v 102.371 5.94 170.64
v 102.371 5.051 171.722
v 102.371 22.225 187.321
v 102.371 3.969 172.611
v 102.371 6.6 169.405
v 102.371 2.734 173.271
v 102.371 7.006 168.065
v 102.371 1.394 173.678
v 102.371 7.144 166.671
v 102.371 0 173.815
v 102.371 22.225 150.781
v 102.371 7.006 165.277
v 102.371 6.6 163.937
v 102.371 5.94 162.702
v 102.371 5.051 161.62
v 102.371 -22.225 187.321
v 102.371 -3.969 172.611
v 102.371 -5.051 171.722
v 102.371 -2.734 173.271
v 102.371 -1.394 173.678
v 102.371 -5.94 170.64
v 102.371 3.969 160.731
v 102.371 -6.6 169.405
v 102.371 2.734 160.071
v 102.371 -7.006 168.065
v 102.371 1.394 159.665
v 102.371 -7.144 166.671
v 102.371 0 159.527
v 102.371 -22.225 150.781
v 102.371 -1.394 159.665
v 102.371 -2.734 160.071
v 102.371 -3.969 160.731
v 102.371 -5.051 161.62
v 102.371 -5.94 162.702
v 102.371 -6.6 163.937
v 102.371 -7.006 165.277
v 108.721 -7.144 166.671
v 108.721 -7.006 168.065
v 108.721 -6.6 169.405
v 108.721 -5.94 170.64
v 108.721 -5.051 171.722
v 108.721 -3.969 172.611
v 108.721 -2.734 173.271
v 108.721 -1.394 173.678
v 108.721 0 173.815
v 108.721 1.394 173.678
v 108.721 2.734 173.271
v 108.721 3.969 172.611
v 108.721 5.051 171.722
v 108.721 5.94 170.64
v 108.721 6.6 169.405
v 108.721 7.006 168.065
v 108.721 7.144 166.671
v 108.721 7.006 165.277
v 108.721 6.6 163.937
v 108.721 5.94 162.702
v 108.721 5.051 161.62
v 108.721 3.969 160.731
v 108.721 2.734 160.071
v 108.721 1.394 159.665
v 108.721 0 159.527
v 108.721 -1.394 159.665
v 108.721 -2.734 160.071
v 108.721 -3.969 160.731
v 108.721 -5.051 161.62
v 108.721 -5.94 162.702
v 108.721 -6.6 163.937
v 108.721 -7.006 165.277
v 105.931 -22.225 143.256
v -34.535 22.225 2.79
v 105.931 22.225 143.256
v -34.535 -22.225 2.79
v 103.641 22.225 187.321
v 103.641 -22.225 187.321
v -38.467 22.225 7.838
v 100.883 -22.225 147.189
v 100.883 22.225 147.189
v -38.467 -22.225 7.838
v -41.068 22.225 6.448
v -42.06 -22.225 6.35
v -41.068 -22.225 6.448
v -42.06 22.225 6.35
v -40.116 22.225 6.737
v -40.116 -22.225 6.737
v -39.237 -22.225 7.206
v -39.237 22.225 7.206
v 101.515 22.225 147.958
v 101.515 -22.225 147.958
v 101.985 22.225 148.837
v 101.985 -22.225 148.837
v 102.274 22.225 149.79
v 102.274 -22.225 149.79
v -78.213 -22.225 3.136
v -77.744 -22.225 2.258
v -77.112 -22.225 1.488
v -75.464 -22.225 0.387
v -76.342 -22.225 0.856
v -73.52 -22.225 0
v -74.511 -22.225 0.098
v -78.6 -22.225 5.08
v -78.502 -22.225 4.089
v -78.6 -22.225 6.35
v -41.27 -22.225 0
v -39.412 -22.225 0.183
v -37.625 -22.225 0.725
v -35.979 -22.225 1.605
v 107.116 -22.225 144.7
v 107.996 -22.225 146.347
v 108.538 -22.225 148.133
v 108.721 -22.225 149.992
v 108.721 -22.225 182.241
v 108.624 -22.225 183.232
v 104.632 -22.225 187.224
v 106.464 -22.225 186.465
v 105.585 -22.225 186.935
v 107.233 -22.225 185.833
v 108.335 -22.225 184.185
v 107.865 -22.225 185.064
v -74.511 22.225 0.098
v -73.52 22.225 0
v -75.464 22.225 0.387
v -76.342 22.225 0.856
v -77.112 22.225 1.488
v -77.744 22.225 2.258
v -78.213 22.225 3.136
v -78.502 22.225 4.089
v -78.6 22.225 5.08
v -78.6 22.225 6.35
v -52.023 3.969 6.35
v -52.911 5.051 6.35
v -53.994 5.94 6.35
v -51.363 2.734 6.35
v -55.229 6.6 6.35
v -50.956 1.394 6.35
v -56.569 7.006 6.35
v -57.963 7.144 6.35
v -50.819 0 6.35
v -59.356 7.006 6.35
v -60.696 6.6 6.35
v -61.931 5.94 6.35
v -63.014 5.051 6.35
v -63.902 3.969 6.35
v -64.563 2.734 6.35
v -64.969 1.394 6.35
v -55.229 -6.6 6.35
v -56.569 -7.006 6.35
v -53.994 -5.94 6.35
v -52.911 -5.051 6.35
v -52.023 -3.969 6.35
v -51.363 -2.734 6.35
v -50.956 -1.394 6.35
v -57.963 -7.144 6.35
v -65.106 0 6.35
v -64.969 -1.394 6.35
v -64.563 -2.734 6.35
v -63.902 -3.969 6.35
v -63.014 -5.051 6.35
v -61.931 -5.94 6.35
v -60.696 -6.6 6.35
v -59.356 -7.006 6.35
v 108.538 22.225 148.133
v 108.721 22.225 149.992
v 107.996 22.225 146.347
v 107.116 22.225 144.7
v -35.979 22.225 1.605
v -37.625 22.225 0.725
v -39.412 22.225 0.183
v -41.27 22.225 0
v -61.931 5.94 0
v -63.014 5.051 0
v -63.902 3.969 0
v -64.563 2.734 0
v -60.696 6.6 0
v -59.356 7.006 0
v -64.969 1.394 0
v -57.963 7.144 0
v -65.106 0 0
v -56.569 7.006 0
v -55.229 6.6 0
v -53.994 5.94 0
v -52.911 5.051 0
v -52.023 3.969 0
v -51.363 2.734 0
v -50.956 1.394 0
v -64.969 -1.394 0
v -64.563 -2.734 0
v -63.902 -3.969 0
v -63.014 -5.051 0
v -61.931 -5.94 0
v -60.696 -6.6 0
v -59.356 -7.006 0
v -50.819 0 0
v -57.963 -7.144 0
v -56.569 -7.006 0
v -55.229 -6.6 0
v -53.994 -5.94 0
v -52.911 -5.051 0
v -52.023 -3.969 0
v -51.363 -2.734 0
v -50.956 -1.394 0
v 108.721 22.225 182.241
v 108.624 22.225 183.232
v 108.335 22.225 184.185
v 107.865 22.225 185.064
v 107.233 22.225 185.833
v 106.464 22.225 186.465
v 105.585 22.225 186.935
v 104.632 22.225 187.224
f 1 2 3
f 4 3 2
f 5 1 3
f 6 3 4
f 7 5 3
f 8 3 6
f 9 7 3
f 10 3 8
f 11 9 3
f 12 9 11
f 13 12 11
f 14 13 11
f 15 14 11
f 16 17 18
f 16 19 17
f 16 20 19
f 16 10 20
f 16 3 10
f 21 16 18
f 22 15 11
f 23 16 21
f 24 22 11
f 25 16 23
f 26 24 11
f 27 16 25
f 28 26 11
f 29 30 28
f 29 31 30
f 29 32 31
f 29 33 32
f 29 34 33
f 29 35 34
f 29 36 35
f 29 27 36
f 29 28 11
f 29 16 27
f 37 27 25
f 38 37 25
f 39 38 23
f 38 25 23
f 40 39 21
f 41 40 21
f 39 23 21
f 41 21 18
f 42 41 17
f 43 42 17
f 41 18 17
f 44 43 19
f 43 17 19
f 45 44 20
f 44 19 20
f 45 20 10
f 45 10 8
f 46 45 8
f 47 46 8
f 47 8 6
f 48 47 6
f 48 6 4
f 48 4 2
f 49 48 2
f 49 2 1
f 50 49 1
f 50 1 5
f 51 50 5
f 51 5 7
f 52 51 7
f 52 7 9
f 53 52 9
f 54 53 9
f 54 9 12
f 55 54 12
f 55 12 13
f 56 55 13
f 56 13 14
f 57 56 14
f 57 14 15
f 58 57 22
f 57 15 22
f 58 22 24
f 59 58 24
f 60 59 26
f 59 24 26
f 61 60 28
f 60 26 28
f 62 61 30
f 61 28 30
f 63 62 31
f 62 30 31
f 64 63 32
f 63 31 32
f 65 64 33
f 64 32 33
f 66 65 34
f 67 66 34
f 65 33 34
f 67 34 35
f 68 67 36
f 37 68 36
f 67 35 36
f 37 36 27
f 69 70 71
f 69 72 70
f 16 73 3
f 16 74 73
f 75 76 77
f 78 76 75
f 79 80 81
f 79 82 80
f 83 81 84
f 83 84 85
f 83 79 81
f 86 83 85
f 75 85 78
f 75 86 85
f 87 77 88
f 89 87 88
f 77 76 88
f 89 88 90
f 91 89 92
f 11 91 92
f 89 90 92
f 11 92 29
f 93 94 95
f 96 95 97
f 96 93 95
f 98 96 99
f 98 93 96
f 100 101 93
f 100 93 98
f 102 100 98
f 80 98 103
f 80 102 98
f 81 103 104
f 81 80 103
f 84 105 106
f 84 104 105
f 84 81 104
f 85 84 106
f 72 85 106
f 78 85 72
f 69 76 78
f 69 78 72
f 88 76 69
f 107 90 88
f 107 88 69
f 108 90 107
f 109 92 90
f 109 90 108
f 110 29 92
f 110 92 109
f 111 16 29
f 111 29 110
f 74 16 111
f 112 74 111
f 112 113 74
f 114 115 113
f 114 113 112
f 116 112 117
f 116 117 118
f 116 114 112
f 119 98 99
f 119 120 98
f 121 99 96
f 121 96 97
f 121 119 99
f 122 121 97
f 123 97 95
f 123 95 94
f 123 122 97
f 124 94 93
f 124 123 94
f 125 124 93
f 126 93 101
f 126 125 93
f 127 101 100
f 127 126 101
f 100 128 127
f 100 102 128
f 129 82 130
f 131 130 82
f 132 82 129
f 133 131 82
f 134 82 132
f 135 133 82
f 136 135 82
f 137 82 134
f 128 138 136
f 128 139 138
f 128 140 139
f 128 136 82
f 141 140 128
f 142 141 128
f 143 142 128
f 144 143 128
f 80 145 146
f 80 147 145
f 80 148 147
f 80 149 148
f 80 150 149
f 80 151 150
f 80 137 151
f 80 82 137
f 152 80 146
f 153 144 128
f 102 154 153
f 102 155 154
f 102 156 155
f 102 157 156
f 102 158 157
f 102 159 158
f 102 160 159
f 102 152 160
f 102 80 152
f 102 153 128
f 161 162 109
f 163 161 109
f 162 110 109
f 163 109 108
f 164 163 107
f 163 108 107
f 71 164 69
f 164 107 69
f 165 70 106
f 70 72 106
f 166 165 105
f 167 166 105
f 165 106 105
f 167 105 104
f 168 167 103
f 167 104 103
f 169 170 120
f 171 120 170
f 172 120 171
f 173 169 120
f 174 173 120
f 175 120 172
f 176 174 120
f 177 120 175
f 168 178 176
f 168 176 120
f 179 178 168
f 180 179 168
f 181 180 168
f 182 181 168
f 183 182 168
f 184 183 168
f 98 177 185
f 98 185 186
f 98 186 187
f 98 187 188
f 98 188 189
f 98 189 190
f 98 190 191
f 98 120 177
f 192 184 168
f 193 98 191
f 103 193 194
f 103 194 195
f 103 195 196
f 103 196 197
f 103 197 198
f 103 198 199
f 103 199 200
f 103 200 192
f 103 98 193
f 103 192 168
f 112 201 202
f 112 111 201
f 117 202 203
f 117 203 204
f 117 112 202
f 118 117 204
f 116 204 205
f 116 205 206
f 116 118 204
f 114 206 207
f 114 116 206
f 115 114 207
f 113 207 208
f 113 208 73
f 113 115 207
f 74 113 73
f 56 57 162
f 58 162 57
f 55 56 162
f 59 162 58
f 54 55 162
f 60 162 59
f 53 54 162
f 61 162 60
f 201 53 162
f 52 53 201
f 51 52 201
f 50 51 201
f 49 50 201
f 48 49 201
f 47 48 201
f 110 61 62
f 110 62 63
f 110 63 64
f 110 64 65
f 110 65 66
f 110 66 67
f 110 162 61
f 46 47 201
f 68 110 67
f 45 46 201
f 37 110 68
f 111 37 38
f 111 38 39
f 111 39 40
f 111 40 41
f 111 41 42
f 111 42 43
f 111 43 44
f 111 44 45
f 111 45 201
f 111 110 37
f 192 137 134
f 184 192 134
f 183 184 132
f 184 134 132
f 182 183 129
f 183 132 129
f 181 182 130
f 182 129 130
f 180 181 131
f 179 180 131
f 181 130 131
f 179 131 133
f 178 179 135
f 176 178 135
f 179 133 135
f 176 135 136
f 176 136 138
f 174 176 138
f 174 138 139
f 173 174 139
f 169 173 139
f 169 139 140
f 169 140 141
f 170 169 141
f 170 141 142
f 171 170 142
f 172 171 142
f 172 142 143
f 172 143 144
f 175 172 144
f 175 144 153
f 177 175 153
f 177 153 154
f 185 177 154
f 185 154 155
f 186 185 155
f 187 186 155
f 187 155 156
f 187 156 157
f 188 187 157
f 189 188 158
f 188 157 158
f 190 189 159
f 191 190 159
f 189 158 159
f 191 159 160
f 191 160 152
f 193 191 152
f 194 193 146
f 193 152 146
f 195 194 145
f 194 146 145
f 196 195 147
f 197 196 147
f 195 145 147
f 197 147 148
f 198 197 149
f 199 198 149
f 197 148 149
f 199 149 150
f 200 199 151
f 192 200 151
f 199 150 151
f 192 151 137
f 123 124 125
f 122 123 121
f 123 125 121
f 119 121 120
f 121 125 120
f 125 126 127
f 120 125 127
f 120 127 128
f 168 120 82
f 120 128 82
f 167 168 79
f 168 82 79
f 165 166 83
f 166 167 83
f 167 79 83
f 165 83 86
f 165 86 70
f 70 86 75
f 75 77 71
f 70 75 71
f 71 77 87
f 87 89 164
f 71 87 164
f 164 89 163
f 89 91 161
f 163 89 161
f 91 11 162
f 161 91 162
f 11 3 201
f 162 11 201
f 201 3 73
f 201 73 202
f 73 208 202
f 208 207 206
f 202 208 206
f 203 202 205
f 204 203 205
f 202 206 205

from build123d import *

# Parameters (mm, degrees)
F1_DEPTH = 22.225
F2_R     = 5.08
F3_R     = 9.525
F4_R     = 7.14375
F5_DEPTH = 25.4
F6_R     = 7.14375
F7_DEPTH = 25.4
F8_R     = 5.08


with BuildPart() as f1:
    # F0 (on Front) → F1 (new body, symmetric)
    with BuildSketch(Plane.XZ):
        Polygon((-78.60008, 0), (-76.23788, 0), (-37.32508, 0), (108.721218, 146.046298), (108.721218, 184.959098), (108.721218, 187.321298), (102.371218, 187.321298), (102.371218, 184.959098), (102.371218, 148.676554), (-39.955336, 6.35), (-76.23788, 6.35), (-78.60008, 6.35), align=None)
    extrude(amount=F1_DEPTH, both=True)

    # F2
    f2_edges = [f1.edges().sort_by_distance(p)[0] for p in [
        (-39.955336, 0, 6.35),
        (102.371218, 0, 148.676554),
    ]]
    fillet(f2_edges, radius=F2_R)

    # F3
    f3_edges = [f1.edges().sort_by_distance(p)[0] for p in [
        (108.721218, 0, 146.046298),
        (-37.32508, 0, 0),
    ]]
    fillet(f3_edges, radius=F3_R)

    # F4 (on face) → F5 (cut)
    with BuildSketch(Plane.XY.offset(6.35)):
        with Locations((-57.96258, 0)):
            Circle(F4_R)
    extrude(amount=-F5_DEPTH, mode=Mode.SUBTRACT)

    # F6 (on face) → F7 (cut)
    with BuildSketch(Plane(origin=(102.371218, 0, 0), x_dir=(0, -1, 0), z_dir=(-1, 0, 0))):
        with Locations((0, 166.671098)):
            Circle(F6_R)
    extrude(amount=-F7_DEPTH, mode=Mode.SUBTRACT)

    # F8
    f8_edges = [f1.edges().sort_by_distance(p)[0] for p in [
        (108.721218, 0, 187.321298),
        (-78.60008, 0, 0),
    ]]
    fillet(f8_edges, radius=F8_R)


solid = f1.part
